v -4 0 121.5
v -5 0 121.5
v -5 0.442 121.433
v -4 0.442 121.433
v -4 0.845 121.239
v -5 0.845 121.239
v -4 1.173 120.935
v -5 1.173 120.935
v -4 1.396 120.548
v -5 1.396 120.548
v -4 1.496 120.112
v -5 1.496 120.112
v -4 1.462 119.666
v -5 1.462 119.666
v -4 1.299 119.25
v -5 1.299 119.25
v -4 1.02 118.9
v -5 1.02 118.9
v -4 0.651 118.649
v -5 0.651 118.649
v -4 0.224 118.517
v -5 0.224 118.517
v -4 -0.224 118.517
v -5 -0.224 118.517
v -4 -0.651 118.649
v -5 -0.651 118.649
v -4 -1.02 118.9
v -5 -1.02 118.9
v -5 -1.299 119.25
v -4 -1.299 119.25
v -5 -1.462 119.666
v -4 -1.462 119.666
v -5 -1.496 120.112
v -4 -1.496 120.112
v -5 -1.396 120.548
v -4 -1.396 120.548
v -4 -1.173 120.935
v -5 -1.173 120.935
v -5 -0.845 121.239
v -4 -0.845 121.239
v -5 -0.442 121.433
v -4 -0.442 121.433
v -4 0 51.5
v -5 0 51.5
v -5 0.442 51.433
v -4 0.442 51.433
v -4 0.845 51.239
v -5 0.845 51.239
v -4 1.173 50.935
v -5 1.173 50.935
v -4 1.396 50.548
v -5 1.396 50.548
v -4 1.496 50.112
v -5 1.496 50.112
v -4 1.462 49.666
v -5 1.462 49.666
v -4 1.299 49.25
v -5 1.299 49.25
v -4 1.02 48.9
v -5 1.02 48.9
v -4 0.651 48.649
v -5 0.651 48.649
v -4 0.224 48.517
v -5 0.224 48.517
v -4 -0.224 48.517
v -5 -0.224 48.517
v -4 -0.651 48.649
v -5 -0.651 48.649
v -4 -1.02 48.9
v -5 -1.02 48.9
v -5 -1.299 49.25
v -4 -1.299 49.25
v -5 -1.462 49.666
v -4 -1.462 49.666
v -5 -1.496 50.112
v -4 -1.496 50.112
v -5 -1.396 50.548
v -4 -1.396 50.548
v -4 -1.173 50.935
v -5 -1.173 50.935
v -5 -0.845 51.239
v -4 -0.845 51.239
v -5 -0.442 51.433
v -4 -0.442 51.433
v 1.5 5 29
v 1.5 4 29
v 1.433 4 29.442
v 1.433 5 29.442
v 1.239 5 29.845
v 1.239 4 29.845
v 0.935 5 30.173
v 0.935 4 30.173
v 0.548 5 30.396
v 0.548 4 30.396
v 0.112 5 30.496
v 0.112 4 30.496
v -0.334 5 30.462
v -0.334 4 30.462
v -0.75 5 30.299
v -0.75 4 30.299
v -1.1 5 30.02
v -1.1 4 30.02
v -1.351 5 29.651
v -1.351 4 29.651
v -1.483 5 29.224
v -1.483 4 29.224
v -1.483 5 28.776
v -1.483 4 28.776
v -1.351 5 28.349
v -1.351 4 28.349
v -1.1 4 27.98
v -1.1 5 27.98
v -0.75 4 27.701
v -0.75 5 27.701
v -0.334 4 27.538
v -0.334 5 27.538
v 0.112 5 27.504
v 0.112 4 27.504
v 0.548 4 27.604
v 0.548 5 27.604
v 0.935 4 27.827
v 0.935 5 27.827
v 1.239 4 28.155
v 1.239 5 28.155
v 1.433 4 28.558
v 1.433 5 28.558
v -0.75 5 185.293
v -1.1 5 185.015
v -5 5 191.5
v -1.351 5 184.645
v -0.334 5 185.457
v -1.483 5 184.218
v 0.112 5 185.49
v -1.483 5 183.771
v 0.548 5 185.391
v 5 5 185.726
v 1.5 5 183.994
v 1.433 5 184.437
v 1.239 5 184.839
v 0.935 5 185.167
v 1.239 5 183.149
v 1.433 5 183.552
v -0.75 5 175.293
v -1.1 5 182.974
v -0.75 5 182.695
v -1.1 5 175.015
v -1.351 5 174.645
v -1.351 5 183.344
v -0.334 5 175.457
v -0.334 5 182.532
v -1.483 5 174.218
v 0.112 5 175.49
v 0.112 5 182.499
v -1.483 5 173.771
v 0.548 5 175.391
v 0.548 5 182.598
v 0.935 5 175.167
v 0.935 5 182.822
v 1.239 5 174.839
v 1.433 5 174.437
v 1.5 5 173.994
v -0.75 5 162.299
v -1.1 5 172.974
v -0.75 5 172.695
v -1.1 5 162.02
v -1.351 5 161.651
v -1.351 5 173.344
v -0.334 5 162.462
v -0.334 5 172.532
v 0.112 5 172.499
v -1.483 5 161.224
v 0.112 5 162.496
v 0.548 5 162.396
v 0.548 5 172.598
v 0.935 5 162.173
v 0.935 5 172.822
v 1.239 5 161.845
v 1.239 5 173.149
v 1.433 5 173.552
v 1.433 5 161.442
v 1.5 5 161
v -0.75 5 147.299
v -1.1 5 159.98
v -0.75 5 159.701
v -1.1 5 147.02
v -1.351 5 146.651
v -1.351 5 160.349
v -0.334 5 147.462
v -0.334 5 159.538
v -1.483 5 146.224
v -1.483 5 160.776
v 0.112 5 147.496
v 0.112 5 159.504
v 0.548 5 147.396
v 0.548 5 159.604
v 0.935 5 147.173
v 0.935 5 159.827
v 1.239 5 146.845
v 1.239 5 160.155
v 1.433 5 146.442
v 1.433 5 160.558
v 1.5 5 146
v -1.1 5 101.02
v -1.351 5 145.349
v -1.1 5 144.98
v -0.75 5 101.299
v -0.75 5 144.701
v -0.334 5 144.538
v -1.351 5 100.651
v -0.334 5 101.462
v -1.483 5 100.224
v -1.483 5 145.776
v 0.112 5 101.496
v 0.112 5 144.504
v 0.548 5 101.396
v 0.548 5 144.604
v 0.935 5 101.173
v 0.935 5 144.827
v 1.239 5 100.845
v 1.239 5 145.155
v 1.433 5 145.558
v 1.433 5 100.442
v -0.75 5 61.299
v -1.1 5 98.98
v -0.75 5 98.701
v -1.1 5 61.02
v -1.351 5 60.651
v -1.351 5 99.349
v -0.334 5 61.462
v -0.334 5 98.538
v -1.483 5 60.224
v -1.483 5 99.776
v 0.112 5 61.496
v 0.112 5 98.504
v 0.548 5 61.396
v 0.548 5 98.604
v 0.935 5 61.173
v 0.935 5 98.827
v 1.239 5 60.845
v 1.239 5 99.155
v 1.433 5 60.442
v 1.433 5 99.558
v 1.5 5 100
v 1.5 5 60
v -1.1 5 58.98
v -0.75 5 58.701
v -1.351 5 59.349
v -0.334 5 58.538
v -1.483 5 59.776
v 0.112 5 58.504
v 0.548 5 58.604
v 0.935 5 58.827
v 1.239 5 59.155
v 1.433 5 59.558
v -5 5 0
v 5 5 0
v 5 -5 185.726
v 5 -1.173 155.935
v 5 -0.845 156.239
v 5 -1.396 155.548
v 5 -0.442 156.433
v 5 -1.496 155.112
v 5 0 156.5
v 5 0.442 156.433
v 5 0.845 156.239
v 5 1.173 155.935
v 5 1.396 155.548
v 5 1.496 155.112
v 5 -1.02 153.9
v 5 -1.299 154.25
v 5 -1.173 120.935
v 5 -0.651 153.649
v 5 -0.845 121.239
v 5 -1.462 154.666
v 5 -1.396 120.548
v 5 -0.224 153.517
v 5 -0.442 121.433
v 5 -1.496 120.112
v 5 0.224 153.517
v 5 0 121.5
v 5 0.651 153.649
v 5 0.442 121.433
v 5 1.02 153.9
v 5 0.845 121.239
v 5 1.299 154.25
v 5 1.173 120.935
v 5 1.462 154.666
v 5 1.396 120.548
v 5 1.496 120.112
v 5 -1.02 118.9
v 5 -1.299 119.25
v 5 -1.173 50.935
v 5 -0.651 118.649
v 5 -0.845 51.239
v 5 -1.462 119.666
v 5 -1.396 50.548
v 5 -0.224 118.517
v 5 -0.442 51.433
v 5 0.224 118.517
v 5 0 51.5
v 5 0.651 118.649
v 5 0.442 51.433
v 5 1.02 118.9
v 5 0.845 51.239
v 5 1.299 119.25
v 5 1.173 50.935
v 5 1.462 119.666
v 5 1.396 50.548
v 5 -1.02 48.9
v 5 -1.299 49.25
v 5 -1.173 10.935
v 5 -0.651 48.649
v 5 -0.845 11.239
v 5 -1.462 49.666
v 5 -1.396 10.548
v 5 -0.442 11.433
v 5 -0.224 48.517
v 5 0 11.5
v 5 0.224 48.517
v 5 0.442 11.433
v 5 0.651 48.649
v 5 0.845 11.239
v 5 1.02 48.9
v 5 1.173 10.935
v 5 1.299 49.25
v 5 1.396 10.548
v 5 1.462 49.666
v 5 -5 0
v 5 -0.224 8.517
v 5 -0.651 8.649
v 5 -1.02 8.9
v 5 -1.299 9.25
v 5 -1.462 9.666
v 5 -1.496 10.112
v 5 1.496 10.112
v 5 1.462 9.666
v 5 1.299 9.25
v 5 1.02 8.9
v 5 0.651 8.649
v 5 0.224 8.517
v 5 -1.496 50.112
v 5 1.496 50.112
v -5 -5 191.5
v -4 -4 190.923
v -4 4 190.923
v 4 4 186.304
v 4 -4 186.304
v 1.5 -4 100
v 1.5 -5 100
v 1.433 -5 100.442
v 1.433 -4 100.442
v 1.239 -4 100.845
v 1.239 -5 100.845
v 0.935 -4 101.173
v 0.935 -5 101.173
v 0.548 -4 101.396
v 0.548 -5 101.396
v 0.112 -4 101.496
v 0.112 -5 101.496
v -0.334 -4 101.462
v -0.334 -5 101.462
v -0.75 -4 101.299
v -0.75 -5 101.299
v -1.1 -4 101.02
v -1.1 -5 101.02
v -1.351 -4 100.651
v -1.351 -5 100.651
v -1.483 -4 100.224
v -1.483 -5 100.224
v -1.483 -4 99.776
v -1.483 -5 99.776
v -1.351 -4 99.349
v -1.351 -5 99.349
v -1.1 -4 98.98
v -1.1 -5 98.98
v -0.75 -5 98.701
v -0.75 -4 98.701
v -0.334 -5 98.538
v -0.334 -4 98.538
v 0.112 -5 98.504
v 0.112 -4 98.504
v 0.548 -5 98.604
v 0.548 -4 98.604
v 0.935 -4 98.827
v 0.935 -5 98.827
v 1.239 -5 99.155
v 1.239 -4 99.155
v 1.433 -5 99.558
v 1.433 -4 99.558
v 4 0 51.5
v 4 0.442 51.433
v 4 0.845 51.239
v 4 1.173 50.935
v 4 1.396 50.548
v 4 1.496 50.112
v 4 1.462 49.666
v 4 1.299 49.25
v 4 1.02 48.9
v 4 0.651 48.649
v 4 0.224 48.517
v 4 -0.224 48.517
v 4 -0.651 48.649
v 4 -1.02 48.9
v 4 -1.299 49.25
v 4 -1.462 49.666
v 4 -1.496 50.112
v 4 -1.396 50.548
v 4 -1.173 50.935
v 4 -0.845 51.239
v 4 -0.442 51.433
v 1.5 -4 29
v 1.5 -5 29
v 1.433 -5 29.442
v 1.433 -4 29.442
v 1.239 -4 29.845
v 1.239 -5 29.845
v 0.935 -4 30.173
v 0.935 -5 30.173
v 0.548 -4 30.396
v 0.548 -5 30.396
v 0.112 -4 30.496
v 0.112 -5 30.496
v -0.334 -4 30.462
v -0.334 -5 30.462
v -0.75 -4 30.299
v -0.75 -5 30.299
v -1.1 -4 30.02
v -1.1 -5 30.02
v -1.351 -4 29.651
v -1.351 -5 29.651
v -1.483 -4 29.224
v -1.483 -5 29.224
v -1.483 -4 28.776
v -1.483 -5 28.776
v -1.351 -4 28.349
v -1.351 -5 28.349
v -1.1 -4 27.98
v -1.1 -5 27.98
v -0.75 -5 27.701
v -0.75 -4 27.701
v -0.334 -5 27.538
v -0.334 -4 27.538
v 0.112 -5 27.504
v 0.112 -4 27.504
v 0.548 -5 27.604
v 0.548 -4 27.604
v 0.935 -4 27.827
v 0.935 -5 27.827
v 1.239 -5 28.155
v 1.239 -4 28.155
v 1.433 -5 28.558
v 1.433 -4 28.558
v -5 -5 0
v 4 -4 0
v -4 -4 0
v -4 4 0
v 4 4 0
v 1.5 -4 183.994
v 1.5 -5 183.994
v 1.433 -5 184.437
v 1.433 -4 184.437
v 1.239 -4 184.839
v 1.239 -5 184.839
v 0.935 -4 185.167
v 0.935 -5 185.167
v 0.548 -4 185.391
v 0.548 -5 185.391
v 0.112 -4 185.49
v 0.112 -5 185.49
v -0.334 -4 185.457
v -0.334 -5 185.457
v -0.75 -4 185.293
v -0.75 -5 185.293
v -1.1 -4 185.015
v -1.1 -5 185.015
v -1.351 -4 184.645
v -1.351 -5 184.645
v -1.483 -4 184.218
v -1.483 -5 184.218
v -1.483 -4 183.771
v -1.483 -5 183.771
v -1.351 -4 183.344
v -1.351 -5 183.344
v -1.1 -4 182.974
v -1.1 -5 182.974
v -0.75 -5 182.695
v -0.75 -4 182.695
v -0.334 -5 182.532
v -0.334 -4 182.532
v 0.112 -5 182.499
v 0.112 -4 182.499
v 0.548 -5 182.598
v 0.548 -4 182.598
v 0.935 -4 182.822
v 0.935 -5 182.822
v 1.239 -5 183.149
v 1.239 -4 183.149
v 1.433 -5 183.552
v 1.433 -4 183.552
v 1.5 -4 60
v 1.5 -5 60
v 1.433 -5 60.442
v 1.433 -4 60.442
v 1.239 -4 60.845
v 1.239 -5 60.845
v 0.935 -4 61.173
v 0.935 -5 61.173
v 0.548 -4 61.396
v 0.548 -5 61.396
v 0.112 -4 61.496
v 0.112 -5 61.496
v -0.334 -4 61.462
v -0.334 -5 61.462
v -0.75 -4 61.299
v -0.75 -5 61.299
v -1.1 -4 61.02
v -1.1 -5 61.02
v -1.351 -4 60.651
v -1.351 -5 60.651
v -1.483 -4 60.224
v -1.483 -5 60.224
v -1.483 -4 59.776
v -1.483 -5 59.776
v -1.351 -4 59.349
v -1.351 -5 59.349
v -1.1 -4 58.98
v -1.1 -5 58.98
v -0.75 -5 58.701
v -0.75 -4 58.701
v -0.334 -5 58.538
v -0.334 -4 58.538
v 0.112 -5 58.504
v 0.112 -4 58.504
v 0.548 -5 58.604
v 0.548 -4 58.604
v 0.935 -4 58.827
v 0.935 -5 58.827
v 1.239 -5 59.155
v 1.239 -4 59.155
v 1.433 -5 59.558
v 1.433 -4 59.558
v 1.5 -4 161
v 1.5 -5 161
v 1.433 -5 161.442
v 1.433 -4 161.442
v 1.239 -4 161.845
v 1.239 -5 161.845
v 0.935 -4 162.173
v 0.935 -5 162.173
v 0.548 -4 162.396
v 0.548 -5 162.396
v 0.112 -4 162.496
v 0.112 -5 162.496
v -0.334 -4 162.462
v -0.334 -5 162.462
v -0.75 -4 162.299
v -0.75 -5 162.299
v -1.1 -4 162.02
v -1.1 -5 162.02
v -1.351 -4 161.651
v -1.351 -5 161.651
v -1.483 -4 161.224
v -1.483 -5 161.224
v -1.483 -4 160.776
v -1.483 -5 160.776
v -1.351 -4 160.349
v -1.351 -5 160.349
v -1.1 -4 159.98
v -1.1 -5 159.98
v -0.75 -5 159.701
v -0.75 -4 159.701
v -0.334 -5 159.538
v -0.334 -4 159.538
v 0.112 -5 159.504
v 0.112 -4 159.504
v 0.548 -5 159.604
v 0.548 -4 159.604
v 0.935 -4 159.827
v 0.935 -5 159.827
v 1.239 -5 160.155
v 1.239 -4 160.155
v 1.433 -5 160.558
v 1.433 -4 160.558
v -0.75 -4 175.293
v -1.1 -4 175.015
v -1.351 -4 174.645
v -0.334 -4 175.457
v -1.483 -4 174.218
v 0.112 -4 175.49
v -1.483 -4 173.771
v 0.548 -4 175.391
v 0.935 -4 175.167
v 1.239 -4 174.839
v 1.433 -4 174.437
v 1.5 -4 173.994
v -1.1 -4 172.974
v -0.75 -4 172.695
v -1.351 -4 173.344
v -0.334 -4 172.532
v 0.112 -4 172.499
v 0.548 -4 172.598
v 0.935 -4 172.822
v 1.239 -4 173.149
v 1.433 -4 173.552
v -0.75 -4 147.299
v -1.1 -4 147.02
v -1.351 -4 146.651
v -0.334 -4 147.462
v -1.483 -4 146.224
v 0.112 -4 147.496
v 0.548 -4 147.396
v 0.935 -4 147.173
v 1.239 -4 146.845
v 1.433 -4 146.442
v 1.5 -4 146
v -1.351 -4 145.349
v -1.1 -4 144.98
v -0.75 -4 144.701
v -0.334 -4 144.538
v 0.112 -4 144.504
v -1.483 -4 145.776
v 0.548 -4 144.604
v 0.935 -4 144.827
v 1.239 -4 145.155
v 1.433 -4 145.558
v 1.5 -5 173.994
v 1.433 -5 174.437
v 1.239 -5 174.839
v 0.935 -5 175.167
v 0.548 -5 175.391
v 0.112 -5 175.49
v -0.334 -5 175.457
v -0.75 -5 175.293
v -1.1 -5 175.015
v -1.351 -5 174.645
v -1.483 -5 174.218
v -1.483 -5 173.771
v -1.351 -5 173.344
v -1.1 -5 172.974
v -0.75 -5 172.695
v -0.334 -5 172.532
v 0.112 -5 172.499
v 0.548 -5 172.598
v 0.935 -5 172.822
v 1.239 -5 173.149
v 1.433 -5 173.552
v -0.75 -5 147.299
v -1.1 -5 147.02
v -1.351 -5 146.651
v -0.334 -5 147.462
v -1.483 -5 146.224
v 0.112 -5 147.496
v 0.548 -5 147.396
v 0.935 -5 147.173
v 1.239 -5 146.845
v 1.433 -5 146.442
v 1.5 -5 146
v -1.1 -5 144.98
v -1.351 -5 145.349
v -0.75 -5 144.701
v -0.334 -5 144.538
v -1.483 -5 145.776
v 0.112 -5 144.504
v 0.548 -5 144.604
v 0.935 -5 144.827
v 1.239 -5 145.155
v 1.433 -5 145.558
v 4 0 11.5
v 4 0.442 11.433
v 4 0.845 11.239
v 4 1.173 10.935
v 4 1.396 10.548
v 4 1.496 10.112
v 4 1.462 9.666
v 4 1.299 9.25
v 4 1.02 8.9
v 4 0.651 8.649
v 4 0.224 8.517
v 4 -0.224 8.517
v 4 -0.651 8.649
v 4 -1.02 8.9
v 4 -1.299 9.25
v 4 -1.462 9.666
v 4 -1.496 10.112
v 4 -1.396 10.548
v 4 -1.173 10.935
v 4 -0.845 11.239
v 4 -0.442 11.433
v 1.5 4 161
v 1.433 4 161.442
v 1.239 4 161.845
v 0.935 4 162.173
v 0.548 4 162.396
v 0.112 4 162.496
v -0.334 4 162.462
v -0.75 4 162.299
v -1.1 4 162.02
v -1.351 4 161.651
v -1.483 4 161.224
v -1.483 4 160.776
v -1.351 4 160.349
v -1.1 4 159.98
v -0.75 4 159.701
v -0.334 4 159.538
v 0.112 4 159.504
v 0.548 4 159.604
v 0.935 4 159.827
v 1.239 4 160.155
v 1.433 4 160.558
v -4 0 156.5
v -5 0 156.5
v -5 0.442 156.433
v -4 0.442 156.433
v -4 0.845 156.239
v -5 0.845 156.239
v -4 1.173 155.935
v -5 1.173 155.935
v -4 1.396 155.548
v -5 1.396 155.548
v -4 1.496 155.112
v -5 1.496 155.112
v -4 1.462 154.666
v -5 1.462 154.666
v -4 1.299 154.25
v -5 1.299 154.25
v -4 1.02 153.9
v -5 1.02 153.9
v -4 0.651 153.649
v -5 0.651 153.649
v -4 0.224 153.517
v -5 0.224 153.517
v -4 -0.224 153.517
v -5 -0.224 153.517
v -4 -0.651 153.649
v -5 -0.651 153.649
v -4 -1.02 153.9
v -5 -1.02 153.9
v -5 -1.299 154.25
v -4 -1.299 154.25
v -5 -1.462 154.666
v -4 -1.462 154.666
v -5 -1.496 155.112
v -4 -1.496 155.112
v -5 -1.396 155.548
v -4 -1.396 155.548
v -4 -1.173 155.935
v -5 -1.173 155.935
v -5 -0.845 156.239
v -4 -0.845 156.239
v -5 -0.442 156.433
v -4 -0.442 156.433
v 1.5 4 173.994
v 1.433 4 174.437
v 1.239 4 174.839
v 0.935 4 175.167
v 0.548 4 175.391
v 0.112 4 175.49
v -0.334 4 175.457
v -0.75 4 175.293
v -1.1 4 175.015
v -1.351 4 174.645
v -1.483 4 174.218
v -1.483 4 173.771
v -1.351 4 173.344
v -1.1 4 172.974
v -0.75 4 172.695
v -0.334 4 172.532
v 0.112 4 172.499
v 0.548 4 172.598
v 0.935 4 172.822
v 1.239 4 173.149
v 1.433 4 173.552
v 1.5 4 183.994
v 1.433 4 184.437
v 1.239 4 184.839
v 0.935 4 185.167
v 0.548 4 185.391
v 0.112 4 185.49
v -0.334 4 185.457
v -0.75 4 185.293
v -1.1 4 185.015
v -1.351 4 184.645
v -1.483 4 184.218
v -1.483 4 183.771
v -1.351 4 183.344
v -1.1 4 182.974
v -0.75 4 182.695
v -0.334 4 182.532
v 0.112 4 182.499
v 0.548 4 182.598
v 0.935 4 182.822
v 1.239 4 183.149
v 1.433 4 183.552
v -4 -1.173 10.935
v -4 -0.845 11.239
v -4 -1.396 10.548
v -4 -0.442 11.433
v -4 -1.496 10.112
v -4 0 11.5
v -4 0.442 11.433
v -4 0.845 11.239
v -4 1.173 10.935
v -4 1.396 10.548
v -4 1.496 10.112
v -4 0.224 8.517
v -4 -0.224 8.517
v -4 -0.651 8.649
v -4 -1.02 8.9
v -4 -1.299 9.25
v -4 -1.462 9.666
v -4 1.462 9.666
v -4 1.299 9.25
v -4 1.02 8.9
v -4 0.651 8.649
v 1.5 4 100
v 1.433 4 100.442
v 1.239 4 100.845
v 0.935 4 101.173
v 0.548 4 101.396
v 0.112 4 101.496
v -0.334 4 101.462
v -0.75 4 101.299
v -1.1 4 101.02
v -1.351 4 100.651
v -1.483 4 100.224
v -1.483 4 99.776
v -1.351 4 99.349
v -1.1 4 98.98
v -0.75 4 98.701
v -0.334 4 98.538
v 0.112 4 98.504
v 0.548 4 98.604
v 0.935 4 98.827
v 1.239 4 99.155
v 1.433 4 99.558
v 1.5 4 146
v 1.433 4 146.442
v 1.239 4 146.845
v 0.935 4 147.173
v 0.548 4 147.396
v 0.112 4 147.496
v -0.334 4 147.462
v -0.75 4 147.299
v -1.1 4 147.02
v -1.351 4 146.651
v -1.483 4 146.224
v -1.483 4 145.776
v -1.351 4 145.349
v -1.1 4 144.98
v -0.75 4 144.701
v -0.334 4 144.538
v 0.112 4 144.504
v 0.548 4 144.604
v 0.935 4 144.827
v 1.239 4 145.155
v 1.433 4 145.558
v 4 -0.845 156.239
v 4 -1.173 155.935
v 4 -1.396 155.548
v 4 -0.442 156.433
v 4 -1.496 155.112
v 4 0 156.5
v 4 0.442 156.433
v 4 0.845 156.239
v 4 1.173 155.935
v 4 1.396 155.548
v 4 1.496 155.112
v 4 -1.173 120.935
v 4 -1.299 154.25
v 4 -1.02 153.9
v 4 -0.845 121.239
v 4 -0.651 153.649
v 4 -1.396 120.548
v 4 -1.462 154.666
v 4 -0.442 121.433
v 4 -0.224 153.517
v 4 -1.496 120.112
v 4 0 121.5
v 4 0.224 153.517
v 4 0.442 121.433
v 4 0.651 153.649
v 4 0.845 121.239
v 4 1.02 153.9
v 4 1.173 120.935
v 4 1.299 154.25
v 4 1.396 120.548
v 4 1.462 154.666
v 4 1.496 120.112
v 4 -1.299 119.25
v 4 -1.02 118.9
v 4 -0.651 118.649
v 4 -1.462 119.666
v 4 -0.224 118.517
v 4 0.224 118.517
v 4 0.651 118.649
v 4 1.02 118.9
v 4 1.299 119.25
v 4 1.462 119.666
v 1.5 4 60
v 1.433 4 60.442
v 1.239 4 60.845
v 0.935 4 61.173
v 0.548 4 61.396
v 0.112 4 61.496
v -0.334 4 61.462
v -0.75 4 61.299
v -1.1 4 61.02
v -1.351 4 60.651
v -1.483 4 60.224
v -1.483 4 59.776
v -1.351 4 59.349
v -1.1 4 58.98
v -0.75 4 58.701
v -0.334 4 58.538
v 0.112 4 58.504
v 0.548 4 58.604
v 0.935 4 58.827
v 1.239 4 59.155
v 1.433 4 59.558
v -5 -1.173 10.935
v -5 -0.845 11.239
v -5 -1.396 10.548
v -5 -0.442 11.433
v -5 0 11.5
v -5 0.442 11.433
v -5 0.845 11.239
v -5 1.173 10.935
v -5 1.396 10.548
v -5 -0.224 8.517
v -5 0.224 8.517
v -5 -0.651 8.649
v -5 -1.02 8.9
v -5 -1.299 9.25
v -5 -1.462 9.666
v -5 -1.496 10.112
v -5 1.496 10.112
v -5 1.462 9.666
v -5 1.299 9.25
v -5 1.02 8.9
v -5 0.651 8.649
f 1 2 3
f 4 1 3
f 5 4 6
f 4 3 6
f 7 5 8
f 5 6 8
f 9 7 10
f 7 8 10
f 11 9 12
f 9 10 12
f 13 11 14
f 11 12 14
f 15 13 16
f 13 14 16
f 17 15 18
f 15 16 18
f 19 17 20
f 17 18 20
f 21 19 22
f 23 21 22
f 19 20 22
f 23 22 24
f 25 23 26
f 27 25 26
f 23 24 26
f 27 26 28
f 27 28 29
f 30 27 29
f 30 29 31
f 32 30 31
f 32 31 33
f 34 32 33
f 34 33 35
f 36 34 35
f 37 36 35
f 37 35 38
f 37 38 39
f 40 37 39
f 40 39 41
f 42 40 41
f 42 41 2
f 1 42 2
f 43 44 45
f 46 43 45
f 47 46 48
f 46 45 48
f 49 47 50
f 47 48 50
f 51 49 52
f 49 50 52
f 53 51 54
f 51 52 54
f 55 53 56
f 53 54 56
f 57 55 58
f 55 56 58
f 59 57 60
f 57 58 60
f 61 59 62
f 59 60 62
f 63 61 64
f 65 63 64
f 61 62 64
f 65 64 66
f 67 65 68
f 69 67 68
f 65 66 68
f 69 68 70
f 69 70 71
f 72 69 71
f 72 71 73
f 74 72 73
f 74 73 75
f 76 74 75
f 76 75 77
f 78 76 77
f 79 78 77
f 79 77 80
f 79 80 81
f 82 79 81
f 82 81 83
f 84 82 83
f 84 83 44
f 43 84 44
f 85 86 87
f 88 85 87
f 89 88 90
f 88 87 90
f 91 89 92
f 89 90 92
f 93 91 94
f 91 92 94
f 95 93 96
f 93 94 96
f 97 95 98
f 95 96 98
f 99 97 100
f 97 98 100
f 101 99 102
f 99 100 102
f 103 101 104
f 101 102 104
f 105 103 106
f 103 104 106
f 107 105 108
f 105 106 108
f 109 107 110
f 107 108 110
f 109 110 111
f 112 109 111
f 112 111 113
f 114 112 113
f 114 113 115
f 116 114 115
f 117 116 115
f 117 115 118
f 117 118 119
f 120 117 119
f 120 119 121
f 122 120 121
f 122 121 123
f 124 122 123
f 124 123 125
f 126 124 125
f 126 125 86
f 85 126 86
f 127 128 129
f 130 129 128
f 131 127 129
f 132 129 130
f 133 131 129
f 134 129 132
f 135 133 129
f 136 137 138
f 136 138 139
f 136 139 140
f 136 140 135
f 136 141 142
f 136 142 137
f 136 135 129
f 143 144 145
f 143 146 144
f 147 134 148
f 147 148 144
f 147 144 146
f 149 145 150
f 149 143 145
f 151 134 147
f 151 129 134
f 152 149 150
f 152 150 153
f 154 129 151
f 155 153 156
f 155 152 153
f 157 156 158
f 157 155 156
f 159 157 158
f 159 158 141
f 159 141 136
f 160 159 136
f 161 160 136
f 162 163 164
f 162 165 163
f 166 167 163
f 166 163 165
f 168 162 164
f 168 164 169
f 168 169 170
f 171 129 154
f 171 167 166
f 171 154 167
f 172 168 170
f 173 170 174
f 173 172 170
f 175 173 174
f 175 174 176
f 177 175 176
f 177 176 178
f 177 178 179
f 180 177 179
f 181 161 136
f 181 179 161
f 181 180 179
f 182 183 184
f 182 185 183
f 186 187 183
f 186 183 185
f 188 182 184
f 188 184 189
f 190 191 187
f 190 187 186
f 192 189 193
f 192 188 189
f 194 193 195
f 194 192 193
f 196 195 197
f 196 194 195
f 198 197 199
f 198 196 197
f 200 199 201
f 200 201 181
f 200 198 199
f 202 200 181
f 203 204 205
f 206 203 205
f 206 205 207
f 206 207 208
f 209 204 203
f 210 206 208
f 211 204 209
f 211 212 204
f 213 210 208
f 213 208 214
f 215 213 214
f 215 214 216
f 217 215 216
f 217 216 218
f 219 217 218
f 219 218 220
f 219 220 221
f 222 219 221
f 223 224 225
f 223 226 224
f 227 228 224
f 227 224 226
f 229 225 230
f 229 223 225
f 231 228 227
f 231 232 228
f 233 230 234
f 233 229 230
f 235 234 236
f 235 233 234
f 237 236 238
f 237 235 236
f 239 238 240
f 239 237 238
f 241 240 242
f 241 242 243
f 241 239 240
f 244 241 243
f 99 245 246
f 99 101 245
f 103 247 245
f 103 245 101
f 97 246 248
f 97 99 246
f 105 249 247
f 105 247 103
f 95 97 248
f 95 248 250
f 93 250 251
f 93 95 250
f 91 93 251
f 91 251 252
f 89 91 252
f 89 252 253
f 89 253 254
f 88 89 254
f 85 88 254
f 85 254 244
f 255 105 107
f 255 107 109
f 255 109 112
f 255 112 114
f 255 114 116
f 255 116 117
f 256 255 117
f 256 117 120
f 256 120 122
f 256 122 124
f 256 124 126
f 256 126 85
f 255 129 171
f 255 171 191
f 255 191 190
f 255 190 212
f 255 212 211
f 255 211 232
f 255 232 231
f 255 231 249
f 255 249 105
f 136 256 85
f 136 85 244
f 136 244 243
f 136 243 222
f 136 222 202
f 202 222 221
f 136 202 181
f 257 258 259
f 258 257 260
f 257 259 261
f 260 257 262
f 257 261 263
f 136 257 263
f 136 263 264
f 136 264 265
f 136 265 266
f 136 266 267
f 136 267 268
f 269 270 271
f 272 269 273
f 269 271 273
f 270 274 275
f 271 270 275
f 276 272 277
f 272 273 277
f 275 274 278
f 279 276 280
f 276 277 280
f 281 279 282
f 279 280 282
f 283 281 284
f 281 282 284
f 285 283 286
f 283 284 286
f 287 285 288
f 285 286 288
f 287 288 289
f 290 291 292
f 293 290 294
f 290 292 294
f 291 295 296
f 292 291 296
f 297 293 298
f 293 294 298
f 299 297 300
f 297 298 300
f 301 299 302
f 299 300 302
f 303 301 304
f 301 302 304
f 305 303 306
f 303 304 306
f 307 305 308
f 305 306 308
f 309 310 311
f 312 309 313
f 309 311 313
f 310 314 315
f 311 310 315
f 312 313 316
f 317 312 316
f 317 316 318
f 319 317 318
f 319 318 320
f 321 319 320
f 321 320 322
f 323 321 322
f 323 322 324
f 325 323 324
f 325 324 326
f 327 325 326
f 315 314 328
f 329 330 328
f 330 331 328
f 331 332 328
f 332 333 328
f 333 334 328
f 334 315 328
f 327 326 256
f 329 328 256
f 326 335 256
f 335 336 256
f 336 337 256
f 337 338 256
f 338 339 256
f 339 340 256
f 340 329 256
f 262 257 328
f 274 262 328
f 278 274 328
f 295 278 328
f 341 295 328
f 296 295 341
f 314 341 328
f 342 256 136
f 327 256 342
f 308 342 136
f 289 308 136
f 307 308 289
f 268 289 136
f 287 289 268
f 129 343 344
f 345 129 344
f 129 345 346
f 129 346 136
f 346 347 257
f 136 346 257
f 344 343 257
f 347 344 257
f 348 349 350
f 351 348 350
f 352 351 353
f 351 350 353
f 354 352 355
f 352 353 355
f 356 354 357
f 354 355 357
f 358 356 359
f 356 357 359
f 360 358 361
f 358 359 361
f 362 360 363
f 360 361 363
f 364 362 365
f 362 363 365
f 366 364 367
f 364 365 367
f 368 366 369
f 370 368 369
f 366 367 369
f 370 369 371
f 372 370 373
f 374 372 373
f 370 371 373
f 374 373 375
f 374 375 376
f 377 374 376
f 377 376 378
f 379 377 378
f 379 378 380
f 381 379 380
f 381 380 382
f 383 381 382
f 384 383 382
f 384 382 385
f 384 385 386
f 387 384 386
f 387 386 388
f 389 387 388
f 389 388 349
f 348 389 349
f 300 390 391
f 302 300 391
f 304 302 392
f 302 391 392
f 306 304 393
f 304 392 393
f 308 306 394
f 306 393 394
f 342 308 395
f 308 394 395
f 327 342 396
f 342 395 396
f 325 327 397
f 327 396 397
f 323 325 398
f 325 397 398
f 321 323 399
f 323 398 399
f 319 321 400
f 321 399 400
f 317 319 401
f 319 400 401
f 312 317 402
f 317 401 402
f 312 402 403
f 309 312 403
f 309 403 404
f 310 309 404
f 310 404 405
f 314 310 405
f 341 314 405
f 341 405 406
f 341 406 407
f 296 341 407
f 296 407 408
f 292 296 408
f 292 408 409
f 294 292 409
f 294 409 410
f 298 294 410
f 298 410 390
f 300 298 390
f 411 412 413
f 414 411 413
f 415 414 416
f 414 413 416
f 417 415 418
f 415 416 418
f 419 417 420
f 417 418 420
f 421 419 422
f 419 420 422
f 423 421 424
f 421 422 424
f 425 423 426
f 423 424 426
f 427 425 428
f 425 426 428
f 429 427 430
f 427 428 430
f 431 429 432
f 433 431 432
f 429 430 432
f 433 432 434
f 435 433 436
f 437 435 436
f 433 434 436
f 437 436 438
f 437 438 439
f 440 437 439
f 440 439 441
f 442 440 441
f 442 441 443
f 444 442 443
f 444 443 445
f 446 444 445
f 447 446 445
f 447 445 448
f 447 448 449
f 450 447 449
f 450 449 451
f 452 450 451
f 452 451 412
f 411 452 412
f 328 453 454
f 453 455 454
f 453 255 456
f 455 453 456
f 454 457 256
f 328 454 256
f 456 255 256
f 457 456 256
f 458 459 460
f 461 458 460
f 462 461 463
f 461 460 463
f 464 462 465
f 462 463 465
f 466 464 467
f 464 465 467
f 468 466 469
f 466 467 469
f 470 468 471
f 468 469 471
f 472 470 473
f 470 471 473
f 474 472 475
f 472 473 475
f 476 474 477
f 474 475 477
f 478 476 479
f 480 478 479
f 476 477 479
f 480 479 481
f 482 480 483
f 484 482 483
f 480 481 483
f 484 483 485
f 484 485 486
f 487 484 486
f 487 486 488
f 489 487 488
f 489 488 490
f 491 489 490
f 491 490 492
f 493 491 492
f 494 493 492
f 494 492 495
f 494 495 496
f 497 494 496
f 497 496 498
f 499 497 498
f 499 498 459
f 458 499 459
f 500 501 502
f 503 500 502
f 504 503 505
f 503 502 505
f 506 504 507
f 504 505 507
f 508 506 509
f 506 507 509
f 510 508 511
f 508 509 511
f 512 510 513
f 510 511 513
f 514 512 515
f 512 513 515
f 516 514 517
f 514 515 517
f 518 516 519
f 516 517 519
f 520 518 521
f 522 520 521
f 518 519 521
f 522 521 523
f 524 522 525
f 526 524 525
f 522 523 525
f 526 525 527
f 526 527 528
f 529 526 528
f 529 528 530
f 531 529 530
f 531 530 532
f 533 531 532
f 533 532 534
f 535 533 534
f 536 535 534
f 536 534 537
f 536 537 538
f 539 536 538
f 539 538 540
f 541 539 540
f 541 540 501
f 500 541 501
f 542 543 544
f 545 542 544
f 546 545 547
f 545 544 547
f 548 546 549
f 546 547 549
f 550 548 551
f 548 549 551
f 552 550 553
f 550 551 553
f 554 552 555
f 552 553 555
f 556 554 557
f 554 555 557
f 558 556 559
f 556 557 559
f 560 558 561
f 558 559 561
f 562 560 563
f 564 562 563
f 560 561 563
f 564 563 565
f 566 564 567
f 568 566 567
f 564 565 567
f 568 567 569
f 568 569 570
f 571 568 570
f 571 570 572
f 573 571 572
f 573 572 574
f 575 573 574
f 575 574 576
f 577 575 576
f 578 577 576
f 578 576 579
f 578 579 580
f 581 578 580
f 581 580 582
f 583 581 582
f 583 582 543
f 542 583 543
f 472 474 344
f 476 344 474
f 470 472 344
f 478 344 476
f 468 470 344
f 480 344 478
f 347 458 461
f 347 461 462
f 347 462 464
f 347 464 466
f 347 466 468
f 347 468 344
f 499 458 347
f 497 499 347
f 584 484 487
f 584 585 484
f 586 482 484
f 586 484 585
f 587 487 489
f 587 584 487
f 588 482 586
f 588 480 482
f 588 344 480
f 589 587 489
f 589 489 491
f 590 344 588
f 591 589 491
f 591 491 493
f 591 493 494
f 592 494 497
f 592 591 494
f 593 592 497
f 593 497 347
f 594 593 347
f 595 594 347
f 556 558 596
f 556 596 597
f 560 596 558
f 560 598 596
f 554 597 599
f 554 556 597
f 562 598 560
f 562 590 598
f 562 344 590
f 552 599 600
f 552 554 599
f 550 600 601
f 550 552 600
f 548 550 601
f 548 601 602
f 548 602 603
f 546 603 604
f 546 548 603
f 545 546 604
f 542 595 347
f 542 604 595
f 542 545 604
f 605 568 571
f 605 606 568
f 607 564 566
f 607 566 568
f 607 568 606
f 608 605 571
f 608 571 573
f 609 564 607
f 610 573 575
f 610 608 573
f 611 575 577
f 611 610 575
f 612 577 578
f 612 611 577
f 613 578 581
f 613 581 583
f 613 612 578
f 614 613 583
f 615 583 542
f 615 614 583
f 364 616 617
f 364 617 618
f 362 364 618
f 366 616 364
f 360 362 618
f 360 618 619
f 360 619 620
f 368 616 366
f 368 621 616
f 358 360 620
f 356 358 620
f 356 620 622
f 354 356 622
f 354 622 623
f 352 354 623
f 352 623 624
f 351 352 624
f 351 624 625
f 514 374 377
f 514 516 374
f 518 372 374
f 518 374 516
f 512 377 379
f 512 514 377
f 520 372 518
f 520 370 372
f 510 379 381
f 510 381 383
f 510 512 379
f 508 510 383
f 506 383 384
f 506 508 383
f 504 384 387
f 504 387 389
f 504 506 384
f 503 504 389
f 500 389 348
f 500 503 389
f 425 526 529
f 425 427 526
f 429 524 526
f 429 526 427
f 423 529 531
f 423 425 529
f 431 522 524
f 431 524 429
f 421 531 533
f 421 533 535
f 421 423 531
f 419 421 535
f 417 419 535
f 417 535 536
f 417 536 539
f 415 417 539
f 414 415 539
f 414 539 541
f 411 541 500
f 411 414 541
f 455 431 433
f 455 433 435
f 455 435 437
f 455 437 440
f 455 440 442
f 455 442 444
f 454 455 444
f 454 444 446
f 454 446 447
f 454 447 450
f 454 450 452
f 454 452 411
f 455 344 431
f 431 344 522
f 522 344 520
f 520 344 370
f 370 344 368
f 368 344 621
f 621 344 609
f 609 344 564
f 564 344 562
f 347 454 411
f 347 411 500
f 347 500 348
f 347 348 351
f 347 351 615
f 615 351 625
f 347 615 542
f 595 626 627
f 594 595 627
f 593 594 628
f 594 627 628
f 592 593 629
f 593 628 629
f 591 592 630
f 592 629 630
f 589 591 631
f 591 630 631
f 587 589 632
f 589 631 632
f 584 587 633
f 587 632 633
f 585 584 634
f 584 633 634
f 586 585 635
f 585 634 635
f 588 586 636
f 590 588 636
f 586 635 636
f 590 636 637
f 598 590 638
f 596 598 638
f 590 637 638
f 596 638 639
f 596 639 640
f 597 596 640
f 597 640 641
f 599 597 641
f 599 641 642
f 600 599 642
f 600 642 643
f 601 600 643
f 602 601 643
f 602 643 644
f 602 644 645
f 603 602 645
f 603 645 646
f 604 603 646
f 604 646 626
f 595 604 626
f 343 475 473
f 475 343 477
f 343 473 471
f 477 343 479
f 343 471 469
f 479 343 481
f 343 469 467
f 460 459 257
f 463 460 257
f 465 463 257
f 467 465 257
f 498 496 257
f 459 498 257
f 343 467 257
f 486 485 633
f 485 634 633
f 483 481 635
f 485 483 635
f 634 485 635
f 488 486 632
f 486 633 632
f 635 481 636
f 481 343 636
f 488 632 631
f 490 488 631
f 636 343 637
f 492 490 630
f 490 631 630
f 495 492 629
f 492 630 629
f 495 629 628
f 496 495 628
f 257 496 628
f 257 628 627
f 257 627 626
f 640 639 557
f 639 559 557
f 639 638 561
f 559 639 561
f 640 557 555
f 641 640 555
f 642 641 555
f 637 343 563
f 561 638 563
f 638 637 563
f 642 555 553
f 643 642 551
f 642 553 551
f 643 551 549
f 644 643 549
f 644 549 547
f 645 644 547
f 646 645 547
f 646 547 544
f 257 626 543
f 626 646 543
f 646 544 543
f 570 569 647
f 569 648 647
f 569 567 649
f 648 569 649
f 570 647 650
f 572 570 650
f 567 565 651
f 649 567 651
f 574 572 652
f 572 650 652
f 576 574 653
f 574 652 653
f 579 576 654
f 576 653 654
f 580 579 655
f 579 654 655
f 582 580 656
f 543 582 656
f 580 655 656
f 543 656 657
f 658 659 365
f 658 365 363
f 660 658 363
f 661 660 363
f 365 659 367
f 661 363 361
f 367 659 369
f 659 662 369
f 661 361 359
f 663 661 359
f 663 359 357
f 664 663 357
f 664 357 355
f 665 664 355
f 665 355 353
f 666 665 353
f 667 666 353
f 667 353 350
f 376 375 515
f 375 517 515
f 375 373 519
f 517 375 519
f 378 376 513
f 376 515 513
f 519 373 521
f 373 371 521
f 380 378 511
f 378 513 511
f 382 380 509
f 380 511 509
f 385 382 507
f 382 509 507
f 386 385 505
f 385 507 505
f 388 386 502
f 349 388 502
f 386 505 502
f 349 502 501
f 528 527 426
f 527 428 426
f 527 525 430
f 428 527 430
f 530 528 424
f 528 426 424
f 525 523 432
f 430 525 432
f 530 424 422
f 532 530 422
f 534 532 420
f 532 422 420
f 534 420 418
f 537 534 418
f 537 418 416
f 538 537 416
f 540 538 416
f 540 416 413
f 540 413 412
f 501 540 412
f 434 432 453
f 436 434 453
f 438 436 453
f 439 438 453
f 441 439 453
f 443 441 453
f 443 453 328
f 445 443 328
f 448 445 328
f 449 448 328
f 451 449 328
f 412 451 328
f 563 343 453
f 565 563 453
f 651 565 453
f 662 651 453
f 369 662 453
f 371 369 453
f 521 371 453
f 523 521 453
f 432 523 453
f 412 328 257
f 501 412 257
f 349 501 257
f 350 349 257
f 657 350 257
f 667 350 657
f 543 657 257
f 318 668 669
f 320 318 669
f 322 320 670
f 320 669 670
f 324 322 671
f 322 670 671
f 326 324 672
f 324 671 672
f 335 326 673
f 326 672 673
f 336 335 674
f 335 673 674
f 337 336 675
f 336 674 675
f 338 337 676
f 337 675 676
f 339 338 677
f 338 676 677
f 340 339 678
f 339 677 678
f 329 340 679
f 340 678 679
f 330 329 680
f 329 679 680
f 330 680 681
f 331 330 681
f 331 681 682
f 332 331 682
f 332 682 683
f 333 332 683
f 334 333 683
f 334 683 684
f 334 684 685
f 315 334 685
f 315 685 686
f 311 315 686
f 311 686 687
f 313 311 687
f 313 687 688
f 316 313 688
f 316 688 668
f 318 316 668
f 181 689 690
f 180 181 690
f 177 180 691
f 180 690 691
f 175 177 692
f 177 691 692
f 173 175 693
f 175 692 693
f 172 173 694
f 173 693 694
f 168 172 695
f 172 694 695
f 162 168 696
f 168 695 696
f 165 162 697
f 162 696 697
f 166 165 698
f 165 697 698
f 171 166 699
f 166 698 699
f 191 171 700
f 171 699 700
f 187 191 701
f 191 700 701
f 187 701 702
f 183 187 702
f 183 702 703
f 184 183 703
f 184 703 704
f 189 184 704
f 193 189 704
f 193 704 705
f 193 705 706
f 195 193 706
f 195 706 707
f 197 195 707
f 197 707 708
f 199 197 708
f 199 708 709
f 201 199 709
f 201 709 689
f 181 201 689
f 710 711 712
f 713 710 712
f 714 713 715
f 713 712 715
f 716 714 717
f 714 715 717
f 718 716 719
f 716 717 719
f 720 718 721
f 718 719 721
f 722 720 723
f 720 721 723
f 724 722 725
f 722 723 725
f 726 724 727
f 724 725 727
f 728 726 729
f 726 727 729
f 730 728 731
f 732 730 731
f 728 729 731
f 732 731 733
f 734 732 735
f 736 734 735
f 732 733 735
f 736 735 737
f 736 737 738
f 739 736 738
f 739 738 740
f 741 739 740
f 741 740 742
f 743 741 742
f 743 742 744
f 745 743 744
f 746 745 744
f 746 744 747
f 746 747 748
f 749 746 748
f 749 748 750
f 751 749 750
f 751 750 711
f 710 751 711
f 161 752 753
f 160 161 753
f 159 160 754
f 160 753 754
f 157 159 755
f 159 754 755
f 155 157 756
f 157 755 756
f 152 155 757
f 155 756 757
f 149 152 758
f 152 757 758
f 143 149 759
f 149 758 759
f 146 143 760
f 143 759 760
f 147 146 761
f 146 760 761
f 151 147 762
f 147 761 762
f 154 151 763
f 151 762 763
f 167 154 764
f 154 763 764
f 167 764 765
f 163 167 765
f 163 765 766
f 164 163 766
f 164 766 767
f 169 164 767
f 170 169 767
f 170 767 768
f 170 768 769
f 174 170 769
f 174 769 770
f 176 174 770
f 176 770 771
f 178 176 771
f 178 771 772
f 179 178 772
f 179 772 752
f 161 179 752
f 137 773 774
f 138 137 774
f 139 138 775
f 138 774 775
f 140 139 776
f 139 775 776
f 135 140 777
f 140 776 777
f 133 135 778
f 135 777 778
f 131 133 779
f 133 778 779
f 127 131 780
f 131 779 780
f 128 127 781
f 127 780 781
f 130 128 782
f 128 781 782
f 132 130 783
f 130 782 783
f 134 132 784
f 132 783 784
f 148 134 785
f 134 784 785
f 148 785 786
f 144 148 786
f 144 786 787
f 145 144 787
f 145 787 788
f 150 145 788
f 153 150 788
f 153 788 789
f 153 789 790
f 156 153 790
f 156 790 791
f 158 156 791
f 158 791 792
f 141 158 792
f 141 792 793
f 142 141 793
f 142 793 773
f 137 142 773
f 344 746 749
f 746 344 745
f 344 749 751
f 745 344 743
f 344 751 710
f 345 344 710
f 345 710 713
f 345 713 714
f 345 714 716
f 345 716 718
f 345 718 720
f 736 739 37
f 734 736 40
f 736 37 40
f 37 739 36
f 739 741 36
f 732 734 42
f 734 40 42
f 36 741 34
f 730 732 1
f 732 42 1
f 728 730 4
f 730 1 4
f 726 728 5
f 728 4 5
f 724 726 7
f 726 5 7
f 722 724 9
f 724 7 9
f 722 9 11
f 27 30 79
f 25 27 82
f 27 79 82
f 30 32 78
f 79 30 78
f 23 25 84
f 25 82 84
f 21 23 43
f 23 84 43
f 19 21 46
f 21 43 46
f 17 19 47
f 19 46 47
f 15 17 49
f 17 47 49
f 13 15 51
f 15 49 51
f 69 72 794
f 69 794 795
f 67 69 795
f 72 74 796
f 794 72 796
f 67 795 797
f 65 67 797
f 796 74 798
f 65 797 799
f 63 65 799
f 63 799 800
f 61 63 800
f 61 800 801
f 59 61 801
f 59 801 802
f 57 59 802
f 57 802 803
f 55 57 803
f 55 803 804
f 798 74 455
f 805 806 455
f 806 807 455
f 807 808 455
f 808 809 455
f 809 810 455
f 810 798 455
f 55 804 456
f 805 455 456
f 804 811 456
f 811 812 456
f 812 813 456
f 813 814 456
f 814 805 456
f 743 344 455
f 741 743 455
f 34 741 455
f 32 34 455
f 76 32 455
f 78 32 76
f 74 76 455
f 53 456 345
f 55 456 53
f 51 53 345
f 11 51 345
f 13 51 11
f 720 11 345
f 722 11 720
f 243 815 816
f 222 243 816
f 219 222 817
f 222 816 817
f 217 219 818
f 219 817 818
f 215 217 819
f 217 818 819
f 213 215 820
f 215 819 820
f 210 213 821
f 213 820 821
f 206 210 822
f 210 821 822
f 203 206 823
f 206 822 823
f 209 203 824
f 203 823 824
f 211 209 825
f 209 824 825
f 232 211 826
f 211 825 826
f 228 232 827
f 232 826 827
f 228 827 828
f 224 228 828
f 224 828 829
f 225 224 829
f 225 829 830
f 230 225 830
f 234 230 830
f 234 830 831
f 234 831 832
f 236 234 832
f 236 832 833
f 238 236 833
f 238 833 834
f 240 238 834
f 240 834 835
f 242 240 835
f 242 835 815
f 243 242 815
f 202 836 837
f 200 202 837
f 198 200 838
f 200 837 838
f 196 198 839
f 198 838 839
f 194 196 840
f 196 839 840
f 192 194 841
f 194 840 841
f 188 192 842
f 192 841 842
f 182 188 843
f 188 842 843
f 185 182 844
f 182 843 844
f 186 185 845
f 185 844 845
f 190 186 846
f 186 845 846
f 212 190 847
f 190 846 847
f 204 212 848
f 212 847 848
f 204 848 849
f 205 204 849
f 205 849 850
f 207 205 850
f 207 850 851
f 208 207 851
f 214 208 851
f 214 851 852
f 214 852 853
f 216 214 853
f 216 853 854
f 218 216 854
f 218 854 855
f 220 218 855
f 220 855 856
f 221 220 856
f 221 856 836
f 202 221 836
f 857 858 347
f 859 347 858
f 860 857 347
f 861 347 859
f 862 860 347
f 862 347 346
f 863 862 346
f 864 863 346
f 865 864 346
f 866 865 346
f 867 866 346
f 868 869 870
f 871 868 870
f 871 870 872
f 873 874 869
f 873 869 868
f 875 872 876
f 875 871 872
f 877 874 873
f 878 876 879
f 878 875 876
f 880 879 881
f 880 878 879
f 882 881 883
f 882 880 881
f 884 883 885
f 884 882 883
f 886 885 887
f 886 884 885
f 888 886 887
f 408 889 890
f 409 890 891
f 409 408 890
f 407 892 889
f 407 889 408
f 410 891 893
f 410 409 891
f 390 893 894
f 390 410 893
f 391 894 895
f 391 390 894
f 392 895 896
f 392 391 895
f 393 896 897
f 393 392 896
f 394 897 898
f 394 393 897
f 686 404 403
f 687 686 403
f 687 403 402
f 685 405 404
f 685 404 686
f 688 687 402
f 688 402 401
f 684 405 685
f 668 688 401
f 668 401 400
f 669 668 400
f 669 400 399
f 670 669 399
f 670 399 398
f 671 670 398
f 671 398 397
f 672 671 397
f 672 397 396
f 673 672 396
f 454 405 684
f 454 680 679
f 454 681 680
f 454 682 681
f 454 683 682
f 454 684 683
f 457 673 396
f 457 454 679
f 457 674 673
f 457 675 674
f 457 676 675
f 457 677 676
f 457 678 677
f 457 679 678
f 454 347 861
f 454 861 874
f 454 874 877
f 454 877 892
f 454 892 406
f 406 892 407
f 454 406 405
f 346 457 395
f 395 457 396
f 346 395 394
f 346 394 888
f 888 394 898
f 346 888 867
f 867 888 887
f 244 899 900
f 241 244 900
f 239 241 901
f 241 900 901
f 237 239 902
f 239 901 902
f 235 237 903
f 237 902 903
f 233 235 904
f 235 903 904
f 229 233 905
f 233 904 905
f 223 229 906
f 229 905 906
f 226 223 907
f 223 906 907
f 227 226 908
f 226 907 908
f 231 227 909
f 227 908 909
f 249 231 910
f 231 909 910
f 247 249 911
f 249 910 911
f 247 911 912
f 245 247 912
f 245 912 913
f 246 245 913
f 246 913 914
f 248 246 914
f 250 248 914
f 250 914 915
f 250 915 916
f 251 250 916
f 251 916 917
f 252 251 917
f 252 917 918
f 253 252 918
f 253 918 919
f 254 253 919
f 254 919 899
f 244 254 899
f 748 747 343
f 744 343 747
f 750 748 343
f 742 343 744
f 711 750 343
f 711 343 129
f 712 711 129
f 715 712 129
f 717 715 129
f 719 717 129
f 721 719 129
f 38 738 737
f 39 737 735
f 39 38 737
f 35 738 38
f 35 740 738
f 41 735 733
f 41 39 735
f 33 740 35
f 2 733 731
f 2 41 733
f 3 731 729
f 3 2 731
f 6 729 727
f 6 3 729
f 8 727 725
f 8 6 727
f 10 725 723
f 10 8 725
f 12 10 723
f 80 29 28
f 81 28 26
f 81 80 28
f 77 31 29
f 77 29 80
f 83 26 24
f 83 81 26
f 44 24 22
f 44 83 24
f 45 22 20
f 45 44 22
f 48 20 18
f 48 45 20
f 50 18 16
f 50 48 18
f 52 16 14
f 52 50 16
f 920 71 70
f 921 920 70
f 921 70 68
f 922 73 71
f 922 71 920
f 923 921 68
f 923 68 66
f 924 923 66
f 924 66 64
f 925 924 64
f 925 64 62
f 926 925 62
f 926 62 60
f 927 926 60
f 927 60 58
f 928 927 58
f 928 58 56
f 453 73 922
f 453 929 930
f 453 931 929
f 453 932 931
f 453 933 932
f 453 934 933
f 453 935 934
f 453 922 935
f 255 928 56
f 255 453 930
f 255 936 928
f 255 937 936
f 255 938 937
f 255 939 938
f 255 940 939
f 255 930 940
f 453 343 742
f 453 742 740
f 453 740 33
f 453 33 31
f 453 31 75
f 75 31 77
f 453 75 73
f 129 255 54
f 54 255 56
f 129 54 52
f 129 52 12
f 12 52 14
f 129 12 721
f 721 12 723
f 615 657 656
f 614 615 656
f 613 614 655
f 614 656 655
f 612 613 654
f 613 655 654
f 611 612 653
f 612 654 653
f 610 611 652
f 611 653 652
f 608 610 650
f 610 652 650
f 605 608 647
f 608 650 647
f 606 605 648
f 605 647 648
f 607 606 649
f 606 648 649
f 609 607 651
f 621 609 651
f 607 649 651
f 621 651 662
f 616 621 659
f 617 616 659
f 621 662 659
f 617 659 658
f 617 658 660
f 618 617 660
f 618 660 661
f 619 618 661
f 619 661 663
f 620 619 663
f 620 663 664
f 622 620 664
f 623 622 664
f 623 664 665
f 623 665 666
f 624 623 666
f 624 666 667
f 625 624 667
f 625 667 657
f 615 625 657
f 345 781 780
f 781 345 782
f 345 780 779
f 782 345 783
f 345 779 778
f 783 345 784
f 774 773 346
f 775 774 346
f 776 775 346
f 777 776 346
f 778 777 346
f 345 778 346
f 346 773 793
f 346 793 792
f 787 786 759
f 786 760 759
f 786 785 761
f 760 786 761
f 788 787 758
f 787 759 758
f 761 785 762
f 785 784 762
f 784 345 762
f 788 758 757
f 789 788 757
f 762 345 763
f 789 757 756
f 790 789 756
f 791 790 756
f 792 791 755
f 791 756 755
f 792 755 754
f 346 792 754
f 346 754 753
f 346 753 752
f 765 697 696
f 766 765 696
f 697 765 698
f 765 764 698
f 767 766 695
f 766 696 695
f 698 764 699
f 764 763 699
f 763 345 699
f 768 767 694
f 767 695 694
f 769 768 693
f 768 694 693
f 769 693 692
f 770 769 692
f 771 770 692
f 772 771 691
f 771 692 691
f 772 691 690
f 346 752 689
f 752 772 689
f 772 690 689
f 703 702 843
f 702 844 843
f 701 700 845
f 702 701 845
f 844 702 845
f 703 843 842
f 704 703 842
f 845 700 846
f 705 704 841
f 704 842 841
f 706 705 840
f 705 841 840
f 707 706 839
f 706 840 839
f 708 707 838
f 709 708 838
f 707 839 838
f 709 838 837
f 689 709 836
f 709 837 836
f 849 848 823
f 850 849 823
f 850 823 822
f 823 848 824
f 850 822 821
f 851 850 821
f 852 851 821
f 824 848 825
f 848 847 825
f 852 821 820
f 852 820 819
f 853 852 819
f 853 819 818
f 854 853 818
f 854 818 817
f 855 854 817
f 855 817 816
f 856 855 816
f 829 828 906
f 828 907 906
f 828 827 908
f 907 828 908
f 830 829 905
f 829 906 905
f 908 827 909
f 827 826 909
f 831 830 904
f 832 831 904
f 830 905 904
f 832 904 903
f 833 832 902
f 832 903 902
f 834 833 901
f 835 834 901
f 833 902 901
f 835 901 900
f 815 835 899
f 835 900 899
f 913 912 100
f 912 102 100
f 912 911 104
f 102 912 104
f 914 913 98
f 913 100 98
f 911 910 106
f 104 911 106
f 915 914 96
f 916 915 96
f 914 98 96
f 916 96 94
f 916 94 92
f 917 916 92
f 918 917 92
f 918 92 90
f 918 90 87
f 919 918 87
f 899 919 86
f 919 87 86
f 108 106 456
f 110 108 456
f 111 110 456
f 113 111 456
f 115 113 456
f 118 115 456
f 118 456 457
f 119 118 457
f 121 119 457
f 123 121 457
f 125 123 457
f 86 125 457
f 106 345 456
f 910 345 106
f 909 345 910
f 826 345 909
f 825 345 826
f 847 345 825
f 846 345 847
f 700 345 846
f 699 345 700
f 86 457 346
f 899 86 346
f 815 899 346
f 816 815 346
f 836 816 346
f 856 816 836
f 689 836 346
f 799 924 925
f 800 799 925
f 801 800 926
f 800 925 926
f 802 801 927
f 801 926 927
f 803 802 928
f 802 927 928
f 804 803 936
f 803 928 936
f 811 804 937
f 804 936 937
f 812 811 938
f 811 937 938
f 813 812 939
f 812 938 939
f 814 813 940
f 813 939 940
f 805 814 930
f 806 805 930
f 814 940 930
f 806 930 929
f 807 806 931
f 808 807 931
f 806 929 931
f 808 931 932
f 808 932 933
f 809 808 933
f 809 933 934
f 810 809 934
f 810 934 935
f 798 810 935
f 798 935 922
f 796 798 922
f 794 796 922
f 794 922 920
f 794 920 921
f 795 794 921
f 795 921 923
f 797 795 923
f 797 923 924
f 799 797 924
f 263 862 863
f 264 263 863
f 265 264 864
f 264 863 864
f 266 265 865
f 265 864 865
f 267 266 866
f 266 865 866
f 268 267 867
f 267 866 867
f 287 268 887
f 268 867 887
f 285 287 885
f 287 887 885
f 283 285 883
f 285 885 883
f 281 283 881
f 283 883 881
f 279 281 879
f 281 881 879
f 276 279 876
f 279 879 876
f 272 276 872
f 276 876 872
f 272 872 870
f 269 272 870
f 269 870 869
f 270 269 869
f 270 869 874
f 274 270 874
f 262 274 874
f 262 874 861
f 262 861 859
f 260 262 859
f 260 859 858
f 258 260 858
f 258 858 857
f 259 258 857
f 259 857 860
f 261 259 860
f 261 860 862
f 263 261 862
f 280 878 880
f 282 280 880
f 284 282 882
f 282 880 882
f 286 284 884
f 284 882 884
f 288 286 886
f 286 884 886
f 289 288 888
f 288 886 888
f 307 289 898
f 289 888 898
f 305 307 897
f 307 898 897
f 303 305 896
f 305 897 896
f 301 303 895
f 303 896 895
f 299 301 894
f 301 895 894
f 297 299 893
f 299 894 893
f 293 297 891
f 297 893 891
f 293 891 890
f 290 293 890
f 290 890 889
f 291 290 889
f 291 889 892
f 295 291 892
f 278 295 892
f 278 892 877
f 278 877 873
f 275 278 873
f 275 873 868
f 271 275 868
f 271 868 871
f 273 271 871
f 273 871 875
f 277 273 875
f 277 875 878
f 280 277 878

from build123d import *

# Parameters (mm, degrees)
SKETCH_1_W          = 10
SKETCH_1_H          = 10
SKETCH_1_W_2        = 8
SKETCH_1_H_2        = 8
EXTRUDE_1_DEPTH     = 191.5
SKETCH_2_R          = 1.5
CUT_EXTRUDE_1_DEPTH = 11
SKETCH_3_R          = 1.5
CUT_EXTRUDE_2_DEPTH = 11


with BuildPart() as part:
    # 草图1 → 拉伸-薄壁1 (new body)
    with BuildSketch(Plane.XY):
        Rectangle(SKETCH_1_W, SKETCH_1_H)
        Rectangle(SKETCH_1_W_2, SKETCH_1_H_2, mode=Mode.SUBTRACT)
    extrude(amount=EXTRUDE_1_DEPTH)

    # 草图2 → 切除-拉伸1 (cut, through all)
    with BuildSketch(Plane.XZ.offset(5)):
        with Locations((0, 183.994446501)):
            Circle(SKETCH_2_R)
        with Locations((0, 29)):
            Circle(SKETCH_2_R)
        with Locations((0, 173.994446501)):
            Circle(SKETCH_2_R)
        with Locations((0, 100)):
            Circle(SKETCH_2_R)
        with Locations((0, 60)):
            Circle(SKETCH_2_R)
        with Locations((0, 146)):
            Circle(SKETCH_2_R)
        with Locations((0, 161)):
            Circle(SKETCH_2_R)
        Polygon((-5, 191.5), (5, 185.726497308), (5, 191.5), align=None)
    extrude(amount=-CUT_EXTRUDE_1_DEPTH, mode=Mode.SUBTRACT)

    # 草图3 → 切除-拉伸2 (cut, through all)
    with BuildSketch(Plane.ZY.offset(5)):
        with Locations((50, 0)):
            Circle(SKETCH_3_R)
        with Locations((120, 0)):
            Circle(SKETCH_3_R)
        with Locations((10, 0)):
            Circle(SKETCH_3_R)
        with Locations((155, 0)):
            Circle(SKETCH_3_R)
    extrude(amount=-CUT_EXTRUDE_2_DEPTH, mode=Mode.SUBTRACT)


solid = part.part
